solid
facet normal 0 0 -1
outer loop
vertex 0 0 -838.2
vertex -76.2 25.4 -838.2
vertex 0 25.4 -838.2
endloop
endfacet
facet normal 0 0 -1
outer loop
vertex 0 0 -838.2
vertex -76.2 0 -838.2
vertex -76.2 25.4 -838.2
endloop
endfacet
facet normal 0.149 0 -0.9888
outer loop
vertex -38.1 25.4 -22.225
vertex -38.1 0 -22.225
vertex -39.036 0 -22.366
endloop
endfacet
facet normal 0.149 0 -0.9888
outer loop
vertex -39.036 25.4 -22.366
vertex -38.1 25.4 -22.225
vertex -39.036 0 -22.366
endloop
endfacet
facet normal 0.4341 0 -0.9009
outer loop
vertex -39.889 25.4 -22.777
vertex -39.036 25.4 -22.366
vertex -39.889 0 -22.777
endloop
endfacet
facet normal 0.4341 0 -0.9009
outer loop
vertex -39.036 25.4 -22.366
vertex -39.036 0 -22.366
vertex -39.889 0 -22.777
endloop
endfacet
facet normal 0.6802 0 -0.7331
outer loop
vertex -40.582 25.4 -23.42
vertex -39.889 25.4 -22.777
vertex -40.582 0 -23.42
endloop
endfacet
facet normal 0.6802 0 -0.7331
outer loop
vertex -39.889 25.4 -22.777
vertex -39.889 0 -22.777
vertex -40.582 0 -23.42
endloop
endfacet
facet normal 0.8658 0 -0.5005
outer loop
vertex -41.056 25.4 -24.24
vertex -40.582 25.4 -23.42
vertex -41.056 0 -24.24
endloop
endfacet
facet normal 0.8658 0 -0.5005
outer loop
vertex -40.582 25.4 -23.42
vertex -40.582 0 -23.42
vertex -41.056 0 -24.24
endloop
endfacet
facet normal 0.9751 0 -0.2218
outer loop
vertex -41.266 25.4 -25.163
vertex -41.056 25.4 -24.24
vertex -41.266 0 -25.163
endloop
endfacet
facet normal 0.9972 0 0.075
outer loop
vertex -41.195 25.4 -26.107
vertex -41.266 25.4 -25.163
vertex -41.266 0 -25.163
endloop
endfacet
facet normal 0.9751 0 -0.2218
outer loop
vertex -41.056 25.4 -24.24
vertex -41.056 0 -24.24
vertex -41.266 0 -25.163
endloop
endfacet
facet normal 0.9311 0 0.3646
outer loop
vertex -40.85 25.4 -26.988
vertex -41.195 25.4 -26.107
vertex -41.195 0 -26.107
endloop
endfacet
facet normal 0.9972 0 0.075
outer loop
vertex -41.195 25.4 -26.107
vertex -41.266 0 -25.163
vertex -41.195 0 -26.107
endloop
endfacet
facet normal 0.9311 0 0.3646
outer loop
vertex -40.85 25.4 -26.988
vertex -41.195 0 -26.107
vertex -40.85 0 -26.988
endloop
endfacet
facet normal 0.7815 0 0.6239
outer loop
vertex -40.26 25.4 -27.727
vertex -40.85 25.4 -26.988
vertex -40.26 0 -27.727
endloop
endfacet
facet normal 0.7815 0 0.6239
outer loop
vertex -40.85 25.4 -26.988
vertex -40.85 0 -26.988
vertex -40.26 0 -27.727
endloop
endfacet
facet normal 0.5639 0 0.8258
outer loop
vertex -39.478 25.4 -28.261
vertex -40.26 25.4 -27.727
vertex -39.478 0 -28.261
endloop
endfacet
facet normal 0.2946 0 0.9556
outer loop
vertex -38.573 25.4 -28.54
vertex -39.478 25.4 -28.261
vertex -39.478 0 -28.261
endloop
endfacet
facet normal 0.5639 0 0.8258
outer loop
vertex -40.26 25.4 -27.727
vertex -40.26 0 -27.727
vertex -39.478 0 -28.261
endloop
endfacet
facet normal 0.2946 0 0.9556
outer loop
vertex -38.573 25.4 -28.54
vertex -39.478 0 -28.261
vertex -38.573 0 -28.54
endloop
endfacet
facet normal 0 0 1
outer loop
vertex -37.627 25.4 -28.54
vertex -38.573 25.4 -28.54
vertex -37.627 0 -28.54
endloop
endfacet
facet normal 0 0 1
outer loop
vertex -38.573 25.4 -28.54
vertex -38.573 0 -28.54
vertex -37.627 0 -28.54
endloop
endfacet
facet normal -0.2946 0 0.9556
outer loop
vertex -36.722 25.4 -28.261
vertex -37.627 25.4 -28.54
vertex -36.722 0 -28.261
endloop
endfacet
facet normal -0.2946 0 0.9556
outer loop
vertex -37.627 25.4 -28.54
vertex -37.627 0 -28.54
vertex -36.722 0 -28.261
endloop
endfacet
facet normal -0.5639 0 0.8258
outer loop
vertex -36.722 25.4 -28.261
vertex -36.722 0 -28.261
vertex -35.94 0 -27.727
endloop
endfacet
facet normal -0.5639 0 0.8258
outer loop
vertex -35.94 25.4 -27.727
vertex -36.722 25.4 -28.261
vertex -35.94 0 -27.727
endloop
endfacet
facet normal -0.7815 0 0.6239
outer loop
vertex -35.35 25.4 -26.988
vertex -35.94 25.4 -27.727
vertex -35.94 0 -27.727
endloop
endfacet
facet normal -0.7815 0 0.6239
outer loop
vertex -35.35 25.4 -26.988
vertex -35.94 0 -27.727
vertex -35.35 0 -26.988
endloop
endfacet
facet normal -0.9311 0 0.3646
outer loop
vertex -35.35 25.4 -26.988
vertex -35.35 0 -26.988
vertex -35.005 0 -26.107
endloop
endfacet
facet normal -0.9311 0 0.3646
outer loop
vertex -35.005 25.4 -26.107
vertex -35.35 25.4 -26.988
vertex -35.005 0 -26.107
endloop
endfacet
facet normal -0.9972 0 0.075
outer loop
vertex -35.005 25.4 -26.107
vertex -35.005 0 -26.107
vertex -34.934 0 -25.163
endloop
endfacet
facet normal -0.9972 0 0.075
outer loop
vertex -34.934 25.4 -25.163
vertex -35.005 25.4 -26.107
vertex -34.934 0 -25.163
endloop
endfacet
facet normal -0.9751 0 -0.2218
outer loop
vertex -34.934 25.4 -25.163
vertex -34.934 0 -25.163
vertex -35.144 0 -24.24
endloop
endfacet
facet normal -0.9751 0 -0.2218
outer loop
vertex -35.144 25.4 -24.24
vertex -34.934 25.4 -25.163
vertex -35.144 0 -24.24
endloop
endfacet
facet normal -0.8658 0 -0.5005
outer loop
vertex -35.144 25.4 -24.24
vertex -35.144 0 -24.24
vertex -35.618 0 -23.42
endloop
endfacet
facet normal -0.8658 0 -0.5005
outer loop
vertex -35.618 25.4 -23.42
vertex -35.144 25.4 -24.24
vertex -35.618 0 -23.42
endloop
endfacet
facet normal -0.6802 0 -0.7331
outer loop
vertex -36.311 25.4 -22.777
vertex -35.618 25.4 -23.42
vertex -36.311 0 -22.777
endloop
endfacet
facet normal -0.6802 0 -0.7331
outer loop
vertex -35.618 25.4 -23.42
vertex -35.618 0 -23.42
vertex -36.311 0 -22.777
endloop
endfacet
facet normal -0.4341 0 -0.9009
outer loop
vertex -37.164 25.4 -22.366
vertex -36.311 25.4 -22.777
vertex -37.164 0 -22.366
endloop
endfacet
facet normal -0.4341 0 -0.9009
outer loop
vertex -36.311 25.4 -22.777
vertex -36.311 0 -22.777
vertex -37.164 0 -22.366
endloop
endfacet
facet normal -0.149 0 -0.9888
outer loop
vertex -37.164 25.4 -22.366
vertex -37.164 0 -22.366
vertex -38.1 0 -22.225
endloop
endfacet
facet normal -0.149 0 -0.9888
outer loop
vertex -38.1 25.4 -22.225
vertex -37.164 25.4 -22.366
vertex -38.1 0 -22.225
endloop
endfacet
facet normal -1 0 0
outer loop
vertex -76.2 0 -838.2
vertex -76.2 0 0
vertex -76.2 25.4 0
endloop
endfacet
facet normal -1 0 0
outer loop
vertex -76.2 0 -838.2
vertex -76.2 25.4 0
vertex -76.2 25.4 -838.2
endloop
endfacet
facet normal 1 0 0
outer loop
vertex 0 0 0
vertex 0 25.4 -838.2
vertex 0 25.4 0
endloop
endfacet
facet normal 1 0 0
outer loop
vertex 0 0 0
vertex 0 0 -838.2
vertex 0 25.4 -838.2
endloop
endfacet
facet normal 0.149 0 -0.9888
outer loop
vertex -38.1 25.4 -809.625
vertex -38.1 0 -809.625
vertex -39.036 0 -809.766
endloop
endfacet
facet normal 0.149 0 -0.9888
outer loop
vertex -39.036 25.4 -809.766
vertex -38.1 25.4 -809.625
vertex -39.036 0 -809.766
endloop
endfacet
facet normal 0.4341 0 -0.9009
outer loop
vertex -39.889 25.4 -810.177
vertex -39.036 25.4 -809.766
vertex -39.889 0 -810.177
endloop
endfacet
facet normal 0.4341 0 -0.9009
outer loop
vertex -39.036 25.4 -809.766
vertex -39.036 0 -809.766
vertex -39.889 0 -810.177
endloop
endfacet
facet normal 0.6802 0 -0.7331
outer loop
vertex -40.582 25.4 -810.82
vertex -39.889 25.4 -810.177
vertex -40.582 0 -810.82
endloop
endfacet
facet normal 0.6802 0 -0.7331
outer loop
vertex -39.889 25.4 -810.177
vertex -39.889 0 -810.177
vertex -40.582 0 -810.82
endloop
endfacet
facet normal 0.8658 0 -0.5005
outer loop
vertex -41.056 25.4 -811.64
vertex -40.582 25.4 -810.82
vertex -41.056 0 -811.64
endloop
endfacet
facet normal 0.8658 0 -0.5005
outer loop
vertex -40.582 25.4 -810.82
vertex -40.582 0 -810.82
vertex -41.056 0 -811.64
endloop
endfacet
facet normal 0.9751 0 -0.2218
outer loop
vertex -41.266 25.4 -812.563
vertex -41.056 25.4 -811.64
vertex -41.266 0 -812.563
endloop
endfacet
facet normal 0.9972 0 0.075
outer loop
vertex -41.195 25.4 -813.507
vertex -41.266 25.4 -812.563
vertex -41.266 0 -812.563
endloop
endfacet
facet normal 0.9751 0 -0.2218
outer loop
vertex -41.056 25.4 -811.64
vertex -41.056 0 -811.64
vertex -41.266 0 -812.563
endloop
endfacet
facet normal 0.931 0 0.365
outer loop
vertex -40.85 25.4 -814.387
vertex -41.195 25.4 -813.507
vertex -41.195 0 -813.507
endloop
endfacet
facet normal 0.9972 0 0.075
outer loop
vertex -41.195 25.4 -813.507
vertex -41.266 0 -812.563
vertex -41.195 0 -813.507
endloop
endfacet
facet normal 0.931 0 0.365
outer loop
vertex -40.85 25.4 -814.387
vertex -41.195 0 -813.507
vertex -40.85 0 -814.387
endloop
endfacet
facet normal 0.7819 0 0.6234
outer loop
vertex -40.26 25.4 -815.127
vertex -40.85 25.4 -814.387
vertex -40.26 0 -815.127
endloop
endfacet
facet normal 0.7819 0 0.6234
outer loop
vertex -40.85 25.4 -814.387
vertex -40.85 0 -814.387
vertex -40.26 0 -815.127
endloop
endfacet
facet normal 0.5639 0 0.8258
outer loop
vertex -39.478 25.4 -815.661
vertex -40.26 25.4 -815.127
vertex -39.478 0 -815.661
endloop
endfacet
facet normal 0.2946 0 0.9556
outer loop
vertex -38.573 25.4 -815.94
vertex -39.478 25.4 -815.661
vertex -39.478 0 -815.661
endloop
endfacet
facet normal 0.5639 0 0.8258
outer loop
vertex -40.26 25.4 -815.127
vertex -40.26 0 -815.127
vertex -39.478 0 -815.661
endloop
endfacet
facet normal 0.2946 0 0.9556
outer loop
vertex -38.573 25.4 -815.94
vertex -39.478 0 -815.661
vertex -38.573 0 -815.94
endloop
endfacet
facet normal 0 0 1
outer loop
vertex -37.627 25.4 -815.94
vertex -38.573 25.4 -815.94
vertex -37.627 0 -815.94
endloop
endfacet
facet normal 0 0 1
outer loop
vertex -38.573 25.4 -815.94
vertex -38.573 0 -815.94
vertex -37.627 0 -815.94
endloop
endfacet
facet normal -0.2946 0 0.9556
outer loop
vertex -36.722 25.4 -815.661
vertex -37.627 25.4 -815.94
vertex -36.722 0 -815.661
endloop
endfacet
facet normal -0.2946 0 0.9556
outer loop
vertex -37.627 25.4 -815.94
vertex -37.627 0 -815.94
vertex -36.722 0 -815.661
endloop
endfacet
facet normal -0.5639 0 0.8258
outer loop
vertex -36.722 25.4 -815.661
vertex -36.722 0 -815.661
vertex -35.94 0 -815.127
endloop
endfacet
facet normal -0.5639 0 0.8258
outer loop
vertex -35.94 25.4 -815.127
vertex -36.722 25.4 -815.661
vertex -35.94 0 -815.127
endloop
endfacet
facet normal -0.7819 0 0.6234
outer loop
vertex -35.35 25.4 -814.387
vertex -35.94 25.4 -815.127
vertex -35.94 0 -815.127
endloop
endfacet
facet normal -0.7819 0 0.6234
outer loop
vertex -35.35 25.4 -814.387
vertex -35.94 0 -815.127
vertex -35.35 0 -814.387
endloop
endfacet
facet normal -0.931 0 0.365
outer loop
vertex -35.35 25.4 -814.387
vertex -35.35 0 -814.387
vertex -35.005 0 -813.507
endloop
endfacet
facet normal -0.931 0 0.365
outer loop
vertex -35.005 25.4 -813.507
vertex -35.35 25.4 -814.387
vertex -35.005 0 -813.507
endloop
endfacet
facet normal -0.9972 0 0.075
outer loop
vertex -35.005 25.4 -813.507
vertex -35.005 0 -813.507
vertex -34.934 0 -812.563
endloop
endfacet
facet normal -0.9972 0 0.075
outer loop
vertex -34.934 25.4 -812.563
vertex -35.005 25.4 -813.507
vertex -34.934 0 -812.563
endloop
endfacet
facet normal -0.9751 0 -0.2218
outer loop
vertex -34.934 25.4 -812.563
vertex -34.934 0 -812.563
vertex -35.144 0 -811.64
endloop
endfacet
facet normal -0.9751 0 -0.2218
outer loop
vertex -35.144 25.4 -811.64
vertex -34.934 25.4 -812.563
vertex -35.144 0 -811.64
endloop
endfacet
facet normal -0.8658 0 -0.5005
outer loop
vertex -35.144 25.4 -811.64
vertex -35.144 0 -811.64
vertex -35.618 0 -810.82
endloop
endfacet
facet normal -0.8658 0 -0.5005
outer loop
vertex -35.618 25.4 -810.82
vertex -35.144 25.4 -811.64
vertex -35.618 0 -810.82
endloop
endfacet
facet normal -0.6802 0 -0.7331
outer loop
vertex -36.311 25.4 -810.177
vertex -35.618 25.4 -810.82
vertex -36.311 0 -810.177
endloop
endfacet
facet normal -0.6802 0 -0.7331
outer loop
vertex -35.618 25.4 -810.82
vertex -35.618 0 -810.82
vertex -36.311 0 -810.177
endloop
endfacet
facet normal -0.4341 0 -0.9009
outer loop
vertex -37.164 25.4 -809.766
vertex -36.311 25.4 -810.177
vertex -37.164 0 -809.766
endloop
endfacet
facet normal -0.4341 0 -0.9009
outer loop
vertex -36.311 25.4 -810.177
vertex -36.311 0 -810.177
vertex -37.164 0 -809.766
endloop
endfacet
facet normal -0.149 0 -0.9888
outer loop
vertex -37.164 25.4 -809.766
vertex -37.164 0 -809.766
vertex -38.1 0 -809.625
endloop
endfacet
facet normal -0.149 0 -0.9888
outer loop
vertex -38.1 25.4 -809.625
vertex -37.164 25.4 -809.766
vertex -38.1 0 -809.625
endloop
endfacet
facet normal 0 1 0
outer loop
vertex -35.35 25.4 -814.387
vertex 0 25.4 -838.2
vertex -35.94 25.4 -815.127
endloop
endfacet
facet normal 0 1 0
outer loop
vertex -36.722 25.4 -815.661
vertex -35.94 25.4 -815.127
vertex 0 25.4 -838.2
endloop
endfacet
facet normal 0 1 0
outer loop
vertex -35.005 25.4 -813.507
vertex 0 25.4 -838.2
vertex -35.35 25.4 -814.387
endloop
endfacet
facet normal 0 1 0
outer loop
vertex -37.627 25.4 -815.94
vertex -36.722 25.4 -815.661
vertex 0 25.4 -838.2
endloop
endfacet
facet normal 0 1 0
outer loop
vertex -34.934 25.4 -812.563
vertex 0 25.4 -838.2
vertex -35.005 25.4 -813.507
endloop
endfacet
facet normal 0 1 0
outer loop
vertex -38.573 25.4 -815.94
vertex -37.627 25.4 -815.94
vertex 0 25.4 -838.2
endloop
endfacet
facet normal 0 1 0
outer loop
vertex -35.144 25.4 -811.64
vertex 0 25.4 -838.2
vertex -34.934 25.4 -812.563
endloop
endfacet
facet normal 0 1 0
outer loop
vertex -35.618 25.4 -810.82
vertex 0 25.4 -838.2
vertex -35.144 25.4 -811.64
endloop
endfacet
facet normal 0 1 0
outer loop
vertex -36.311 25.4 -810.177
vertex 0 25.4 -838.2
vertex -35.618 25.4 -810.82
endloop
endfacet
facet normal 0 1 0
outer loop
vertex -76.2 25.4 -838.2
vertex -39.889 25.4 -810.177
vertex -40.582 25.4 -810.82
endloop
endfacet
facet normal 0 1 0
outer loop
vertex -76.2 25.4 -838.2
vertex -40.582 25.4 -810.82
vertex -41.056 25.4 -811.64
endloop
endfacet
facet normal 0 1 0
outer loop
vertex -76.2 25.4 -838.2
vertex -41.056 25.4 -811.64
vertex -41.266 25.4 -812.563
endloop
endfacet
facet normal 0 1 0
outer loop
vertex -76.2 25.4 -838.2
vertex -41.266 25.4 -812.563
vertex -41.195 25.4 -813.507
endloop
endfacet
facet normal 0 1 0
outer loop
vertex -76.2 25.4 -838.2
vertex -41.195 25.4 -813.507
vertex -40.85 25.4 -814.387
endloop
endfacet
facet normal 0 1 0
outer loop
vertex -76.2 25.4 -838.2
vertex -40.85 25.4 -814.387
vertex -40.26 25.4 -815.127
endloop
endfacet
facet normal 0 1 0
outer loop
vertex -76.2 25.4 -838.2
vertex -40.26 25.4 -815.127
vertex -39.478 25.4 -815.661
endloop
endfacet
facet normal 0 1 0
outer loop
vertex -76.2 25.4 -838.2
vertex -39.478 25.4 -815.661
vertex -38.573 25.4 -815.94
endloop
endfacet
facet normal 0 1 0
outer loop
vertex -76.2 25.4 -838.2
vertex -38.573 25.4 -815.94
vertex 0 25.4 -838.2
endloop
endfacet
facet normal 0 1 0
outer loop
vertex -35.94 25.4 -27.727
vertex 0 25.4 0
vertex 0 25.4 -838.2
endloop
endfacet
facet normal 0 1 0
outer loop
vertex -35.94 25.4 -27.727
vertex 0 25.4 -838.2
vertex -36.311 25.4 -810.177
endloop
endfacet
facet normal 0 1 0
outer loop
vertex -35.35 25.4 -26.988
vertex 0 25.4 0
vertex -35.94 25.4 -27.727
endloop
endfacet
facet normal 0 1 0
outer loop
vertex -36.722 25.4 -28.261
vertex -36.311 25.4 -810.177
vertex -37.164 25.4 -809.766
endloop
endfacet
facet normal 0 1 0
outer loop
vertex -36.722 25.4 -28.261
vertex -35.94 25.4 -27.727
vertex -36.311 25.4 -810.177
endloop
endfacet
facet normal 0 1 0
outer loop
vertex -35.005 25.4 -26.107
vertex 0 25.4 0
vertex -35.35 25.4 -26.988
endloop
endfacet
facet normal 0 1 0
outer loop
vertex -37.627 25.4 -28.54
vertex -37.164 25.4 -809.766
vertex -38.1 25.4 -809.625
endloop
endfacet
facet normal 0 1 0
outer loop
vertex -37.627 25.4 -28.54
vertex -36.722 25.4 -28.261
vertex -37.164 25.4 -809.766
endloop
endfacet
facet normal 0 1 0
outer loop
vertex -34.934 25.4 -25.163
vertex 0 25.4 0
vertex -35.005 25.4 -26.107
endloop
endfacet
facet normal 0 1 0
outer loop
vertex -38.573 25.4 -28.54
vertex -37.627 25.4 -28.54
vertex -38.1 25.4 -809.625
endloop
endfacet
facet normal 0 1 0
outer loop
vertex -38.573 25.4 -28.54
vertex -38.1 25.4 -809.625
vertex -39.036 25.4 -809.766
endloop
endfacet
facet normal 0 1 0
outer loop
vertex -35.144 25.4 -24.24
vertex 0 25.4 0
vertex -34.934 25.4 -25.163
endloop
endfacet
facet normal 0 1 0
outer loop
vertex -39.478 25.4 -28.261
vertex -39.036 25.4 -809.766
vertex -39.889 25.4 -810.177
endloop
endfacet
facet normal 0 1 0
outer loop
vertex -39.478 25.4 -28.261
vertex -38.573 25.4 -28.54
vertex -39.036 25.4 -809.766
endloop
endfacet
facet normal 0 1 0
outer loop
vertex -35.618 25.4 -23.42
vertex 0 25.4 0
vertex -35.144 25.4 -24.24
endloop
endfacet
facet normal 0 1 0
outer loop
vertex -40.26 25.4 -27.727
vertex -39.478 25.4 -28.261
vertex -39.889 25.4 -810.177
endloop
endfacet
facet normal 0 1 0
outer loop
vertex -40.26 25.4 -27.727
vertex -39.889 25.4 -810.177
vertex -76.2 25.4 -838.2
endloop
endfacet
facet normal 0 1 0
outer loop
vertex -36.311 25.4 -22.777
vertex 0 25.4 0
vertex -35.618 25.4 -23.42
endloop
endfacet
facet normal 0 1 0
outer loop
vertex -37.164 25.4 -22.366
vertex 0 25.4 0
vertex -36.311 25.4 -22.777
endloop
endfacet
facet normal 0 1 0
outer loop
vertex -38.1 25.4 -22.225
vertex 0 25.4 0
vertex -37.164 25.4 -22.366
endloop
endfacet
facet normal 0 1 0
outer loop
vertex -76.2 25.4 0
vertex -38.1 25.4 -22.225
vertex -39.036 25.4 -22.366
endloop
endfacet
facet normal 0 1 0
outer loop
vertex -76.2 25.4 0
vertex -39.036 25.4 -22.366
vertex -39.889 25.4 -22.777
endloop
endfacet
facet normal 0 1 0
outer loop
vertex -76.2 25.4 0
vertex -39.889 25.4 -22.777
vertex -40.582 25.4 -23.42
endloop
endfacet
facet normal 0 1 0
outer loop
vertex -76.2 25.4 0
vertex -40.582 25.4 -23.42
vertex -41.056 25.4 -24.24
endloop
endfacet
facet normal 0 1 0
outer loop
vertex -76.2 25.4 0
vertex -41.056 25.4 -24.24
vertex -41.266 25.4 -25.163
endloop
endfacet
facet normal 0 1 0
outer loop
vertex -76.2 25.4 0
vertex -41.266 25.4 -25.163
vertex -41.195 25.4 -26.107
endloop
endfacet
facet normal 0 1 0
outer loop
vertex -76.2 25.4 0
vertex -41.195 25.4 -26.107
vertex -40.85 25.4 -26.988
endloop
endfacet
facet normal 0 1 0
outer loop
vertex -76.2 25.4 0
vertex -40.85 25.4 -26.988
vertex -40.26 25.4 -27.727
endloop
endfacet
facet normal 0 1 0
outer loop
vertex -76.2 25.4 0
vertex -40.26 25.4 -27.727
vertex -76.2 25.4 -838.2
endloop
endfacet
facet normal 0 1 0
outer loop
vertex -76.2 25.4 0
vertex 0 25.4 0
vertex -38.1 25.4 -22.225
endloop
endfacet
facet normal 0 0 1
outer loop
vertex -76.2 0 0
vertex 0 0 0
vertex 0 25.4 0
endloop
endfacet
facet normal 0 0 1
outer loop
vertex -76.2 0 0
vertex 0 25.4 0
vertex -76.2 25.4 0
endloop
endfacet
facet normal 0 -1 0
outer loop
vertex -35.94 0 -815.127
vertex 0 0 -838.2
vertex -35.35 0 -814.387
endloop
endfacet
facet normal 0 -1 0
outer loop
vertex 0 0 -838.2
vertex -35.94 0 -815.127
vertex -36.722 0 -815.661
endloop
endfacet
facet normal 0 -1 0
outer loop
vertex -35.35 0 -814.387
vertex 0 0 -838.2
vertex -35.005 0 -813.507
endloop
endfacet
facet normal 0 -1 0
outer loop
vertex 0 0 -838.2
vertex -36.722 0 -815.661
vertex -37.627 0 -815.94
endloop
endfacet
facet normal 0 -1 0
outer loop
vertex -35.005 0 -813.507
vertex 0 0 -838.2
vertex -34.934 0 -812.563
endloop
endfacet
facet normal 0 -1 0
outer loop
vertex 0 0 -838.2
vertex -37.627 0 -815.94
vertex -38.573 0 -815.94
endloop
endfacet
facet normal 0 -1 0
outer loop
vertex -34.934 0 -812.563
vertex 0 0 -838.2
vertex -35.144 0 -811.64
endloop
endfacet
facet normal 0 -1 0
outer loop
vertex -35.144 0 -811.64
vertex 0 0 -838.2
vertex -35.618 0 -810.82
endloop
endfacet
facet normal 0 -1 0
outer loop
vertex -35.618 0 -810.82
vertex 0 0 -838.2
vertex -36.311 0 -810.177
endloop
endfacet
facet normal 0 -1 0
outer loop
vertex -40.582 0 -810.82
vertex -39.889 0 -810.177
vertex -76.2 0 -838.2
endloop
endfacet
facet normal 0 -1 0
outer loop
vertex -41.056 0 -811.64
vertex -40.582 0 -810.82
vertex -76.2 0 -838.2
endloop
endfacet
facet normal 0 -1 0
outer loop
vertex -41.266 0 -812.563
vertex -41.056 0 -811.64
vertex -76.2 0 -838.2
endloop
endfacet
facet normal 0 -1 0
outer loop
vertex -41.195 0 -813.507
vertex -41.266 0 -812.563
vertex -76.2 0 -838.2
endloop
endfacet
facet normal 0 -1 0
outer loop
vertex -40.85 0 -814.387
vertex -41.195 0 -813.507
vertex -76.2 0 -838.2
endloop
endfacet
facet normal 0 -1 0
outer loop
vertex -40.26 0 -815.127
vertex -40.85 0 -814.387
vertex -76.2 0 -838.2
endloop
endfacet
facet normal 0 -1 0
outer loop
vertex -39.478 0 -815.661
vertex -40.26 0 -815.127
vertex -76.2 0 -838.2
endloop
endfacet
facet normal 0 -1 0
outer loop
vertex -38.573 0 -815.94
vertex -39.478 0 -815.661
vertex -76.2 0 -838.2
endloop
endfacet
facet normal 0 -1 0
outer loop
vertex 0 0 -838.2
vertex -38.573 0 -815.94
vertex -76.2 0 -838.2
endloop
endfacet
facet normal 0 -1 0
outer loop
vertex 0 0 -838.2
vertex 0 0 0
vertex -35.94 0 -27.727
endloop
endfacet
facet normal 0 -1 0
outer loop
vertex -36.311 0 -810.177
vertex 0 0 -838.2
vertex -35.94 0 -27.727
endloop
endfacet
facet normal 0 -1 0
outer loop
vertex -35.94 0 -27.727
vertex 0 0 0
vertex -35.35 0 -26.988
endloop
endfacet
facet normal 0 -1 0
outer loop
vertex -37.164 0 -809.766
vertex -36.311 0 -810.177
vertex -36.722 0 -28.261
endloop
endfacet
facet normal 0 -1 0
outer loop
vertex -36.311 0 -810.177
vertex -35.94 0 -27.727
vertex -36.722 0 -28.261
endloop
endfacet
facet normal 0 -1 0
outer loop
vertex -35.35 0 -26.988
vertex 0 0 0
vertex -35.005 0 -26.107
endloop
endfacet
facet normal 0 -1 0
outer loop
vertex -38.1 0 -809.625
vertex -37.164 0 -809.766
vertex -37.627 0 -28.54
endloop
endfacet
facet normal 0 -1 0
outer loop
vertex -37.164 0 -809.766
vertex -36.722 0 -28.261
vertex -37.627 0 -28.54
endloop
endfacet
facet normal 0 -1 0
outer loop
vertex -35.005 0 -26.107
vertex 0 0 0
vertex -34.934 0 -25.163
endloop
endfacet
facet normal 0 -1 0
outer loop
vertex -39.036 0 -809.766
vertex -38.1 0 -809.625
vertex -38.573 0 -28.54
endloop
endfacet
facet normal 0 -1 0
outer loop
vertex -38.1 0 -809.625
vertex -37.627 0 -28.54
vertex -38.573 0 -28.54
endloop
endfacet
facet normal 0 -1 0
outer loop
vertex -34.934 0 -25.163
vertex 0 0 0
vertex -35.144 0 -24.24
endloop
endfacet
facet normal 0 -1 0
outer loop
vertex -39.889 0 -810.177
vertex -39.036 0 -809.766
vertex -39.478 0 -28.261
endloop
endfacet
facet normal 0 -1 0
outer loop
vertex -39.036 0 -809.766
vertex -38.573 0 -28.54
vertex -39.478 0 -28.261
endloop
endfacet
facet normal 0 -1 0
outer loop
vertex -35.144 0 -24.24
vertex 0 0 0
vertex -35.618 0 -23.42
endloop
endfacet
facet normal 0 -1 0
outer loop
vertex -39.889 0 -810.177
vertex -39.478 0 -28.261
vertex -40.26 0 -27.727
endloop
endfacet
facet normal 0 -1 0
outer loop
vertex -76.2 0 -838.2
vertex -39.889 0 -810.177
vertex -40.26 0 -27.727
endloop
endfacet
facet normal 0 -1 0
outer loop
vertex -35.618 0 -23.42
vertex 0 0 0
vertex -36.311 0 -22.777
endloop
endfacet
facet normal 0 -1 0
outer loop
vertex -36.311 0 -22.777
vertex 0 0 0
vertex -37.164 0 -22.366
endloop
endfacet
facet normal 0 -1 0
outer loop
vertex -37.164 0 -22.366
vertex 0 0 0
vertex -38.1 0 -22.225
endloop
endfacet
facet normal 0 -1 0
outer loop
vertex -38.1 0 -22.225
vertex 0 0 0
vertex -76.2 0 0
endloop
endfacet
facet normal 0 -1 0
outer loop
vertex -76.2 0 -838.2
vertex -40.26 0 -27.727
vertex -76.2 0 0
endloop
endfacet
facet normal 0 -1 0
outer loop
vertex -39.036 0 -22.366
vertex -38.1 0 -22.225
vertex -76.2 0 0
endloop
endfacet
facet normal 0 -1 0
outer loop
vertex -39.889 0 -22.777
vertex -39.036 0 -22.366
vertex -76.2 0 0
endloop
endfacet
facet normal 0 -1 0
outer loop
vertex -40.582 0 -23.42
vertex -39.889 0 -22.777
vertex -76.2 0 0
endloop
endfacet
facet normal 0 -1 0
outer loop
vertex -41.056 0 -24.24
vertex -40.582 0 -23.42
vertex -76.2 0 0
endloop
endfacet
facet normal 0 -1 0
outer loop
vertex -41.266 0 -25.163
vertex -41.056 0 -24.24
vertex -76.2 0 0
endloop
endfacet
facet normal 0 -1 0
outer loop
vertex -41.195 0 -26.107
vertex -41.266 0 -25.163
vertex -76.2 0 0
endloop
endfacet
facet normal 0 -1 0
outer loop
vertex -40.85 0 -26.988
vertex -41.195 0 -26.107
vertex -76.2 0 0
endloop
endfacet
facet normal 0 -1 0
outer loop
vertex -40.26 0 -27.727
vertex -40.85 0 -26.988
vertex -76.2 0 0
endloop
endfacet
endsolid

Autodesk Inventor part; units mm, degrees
ref_plane "YZ Plane" through (0, 0, 0) normal (1, 0, 0) x (0, 1, 0)
ref_plane "XZ Plane" through (0, 0, 0) normal (0, 1, 0) x (-1, 0, 0)
ref_plane "XY Plane" through (0, 0, 0) normal (0, 0, 1) x (1, 0, 0)
sketch "Sketch1" plane through (0, 0, 0) normal (0, 1, 0) x (-1, 0, 0)
  line L0 (0, 0) -> (76.2, 0)
  line L1 (76.2, 0) -> (76.2, -838.2)
  line L2 (76.2, -838.2) -> (0, -838.2)
  line L3 (0, -838.2) -> (0, 0)
  dimension "d0" = 76.2
  dimension "d1" = 838.2
extrude "Extrusion1" add sketch "Sketch1" along normal blind 25.4
sketch "Sketch2" plane through (0, 25.4, 0) normal (0, 1, 0) x (1, 0, 0)
  line L0 (-76.2, 0) -> (0, 0) projected
  line L1 (-76.2, 838.2) -> (-76.2, 0) projected
  point P0 (-38.1, 25.4)
  point P1 (-38.1, 812.8)
  point P2 (-38.1, 419.1)
  point P3 (-38.1, 0)
  point P4 (-76.2, 419.1)
  dimension "d4" = 787.4
  dimension "d5" = 393.7
hole "Hole1" at (-38.1, 25.4, -812.8) at (-38.1, 25.4, -25.4) direction (0, -1, 0) diameter 6.35 end through all
equation "\"d5\" = 0.5 * d4"
properties part number "CarrierBracket" material "Wood (Birch)"
